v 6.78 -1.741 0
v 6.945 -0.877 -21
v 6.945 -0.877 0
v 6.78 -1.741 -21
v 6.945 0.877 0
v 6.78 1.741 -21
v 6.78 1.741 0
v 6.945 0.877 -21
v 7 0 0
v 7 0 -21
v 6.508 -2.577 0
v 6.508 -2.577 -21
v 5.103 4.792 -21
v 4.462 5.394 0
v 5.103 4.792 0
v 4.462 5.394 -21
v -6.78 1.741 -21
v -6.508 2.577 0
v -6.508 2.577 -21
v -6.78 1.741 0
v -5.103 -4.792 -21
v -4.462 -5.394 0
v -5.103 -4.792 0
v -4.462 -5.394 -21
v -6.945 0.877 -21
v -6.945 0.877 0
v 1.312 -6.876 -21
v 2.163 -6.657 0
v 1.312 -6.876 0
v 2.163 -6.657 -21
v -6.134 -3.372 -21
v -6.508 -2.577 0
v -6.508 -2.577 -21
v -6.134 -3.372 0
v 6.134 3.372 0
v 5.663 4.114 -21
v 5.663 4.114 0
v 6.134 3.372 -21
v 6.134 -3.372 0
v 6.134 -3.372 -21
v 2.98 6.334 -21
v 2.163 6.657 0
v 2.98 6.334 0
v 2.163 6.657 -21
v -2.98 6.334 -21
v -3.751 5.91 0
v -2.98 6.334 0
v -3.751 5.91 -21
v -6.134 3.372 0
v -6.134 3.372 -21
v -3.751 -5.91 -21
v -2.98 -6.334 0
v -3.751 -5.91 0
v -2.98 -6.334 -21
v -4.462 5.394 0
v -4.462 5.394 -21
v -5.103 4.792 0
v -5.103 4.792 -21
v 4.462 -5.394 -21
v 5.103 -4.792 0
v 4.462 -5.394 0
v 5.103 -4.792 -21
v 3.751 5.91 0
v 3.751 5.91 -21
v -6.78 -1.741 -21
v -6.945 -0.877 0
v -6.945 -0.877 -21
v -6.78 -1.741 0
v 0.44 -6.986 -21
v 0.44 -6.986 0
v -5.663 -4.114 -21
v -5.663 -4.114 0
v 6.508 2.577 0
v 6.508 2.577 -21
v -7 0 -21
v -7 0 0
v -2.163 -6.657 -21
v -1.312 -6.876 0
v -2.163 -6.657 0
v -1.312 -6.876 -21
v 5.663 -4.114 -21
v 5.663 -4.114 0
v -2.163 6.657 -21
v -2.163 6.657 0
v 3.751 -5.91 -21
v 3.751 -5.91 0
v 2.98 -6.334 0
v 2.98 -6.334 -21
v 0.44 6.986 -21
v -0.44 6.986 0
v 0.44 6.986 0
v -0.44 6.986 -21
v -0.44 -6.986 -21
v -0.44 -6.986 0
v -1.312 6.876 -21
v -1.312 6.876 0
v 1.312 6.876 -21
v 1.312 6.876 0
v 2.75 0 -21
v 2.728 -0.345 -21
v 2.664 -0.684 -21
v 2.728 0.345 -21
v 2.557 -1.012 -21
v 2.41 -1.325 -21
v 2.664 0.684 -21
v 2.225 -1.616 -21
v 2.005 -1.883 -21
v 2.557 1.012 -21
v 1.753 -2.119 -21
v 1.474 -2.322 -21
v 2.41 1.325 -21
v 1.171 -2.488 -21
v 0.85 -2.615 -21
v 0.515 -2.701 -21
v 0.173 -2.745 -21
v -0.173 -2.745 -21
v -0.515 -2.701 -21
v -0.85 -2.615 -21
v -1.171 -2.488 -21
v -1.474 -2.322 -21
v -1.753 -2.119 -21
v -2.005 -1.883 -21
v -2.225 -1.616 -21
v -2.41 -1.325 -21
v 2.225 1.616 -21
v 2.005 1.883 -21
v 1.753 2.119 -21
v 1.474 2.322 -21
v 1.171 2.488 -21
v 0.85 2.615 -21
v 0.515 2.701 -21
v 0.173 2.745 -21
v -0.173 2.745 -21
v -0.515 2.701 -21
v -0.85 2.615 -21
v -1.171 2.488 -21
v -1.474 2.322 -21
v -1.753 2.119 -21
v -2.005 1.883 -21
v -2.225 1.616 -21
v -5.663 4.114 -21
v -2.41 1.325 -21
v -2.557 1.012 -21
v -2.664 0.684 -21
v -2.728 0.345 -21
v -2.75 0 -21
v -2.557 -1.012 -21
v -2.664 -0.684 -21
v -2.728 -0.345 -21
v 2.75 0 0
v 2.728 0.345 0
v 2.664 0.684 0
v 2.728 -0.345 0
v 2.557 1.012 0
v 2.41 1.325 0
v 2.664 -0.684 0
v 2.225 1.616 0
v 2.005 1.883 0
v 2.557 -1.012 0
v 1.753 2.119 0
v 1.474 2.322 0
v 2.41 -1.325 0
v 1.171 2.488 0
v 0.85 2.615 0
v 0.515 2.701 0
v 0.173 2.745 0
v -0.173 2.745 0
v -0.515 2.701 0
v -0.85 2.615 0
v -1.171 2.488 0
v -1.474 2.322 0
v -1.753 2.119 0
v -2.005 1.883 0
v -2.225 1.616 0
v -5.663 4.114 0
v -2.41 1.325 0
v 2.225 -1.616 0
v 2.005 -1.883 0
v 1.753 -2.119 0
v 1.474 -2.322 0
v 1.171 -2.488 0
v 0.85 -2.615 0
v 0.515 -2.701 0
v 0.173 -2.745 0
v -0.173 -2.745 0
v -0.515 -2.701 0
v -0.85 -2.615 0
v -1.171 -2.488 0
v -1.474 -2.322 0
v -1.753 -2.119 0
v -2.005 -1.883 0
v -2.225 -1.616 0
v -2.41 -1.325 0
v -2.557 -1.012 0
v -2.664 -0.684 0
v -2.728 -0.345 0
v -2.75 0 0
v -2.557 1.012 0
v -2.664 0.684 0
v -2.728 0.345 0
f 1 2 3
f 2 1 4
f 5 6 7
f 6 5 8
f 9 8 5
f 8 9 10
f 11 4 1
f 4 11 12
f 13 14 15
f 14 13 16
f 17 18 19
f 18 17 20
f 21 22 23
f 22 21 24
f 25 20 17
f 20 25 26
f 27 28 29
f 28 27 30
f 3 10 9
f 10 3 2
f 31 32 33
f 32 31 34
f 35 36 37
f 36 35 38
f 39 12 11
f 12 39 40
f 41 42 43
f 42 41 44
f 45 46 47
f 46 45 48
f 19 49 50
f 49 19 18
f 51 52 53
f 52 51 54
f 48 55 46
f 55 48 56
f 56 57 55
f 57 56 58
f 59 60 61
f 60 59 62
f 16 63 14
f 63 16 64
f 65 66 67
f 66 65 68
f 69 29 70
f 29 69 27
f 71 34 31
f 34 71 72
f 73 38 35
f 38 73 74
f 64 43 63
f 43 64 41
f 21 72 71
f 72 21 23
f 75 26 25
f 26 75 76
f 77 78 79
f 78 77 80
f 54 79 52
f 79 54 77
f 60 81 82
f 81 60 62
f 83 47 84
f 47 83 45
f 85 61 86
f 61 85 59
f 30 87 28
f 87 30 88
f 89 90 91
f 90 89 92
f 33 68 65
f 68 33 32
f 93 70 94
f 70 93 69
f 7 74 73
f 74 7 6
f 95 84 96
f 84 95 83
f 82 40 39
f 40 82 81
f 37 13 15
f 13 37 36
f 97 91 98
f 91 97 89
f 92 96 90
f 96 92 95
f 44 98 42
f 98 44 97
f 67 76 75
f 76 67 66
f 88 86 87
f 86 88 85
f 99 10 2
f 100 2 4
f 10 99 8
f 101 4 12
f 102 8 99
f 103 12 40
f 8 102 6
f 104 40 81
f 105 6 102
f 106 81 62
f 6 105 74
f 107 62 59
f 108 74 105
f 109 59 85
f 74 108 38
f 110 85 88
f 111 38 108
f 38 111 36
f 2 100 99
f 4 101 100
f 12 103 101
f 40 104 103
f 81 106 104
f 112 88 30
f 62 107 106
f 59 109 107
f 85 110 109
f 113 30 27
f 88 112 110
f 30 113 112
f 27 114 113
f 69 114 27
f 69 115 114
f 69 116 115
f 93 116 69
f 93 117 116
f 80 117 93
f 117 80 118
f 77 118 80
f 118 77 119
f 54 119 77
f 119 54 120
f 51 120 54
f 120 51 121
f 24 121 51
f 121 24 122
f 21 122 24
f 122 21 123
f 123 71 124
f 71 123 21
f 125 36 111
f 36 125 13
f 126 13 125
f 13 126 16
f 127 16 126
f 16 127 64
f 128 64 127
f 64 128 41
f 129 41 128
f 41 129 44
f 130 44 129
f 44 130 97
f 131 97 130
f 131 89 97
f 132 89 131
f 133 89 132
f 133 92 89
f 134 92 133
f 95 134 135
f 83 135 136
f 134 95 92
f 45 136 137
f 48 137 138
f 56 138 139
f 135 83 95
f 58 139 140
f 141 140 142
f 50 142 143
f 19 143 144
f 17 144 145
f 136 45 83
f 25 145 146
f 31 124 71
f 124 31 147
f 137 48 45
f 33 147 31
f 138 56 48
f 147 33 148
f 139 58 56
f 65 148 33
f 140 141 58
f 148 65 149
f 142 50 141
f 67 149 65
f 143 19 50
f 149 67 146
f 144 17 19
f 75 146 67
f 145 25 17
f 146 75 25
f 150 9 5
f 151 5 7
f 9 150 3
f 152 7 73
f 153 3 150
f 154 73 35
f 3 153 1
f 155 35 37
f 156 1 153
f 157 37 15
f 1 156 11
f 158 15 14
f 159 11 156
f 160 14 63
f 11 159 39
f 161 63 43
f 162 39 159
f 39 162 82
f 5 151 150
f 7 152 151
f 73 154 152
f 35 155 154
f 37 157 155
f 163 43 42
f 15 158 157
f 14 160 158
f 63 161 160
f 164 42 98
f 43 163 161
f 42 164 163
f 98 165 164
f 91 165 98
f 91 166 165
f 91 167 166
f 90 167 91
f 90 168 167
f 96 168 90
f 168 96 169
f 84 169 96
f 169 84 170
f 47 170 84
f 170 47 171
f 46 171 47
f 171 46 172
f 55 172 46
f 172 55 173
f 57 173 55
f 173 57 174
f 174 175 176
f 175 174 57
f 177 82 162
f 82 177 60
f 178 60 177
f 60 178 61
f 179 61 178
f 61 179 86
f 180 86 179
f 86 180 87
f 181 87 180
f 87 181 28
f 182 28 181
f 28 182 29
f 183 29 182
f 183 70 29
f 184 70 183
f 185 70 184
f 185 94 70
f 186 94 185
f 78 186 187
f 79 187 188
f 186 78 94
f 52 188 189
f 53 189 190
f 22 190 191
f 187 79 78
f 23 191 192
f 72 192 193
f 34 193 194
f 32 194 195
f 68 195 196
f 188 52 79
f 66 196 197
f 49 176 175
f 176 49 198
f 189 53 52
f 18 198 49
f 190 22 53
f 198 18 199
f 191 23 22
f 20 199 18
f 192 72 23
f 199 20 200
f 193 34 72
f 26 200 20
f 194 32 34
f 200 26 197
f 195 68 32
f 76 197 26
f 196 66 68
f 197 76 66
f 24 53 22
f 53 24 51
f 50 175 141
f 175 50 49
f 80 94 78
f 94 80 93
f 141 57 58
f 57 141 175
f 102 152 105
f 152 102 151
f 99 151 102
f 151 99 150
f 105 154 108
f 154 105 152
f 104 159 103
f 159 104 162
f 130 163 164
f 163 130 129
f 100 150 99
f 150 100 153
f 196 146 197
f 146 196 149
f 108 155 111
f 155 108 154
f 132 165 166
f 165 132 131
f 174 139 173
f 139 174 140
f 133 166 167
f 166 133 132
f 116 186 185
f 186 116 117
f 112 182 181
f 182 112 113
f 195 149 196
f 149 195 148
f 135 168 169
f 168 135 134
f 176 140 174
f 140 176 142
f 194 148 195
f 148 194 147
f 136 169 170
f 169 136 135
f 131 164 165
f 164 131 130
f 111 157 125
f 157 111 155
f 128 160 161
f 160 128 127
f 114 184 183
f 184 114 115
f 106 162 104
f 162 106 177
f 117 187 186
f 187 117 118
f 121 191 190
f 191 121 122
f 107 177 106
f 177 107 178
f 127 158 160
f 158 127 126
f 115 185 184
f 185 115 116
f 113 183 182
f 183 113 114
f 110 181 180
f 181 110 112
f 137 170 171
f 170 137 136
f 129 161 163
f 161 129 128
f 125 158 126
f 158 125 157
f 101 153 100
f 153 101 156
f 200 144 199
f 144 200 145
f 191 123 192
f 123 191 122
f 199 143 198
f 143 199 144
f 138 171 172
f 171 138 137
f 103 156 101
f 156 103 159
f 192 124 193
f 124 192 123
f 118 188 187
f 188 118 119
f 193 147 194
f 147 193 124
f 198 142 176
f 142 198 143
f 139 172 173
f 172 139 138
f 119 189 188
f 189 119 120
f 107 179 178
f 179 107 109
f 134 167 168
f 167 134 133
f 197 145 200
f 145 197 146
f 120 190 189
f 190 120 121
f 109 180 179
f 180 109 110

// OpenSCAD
$fn = 50;


difference() {
	union() {
		translate(v = [0, 0, -21.0000000000]) {
			cylinder(h = 21, r = 7.0000000000);
		}
		cylinder(h = 0, r = 10.0000000000);
	}
	union() {
		#translate(v = [0, 0, -21]) {
			cylinder(h = 21, r = 2.7500000000);
		}
	}
}
